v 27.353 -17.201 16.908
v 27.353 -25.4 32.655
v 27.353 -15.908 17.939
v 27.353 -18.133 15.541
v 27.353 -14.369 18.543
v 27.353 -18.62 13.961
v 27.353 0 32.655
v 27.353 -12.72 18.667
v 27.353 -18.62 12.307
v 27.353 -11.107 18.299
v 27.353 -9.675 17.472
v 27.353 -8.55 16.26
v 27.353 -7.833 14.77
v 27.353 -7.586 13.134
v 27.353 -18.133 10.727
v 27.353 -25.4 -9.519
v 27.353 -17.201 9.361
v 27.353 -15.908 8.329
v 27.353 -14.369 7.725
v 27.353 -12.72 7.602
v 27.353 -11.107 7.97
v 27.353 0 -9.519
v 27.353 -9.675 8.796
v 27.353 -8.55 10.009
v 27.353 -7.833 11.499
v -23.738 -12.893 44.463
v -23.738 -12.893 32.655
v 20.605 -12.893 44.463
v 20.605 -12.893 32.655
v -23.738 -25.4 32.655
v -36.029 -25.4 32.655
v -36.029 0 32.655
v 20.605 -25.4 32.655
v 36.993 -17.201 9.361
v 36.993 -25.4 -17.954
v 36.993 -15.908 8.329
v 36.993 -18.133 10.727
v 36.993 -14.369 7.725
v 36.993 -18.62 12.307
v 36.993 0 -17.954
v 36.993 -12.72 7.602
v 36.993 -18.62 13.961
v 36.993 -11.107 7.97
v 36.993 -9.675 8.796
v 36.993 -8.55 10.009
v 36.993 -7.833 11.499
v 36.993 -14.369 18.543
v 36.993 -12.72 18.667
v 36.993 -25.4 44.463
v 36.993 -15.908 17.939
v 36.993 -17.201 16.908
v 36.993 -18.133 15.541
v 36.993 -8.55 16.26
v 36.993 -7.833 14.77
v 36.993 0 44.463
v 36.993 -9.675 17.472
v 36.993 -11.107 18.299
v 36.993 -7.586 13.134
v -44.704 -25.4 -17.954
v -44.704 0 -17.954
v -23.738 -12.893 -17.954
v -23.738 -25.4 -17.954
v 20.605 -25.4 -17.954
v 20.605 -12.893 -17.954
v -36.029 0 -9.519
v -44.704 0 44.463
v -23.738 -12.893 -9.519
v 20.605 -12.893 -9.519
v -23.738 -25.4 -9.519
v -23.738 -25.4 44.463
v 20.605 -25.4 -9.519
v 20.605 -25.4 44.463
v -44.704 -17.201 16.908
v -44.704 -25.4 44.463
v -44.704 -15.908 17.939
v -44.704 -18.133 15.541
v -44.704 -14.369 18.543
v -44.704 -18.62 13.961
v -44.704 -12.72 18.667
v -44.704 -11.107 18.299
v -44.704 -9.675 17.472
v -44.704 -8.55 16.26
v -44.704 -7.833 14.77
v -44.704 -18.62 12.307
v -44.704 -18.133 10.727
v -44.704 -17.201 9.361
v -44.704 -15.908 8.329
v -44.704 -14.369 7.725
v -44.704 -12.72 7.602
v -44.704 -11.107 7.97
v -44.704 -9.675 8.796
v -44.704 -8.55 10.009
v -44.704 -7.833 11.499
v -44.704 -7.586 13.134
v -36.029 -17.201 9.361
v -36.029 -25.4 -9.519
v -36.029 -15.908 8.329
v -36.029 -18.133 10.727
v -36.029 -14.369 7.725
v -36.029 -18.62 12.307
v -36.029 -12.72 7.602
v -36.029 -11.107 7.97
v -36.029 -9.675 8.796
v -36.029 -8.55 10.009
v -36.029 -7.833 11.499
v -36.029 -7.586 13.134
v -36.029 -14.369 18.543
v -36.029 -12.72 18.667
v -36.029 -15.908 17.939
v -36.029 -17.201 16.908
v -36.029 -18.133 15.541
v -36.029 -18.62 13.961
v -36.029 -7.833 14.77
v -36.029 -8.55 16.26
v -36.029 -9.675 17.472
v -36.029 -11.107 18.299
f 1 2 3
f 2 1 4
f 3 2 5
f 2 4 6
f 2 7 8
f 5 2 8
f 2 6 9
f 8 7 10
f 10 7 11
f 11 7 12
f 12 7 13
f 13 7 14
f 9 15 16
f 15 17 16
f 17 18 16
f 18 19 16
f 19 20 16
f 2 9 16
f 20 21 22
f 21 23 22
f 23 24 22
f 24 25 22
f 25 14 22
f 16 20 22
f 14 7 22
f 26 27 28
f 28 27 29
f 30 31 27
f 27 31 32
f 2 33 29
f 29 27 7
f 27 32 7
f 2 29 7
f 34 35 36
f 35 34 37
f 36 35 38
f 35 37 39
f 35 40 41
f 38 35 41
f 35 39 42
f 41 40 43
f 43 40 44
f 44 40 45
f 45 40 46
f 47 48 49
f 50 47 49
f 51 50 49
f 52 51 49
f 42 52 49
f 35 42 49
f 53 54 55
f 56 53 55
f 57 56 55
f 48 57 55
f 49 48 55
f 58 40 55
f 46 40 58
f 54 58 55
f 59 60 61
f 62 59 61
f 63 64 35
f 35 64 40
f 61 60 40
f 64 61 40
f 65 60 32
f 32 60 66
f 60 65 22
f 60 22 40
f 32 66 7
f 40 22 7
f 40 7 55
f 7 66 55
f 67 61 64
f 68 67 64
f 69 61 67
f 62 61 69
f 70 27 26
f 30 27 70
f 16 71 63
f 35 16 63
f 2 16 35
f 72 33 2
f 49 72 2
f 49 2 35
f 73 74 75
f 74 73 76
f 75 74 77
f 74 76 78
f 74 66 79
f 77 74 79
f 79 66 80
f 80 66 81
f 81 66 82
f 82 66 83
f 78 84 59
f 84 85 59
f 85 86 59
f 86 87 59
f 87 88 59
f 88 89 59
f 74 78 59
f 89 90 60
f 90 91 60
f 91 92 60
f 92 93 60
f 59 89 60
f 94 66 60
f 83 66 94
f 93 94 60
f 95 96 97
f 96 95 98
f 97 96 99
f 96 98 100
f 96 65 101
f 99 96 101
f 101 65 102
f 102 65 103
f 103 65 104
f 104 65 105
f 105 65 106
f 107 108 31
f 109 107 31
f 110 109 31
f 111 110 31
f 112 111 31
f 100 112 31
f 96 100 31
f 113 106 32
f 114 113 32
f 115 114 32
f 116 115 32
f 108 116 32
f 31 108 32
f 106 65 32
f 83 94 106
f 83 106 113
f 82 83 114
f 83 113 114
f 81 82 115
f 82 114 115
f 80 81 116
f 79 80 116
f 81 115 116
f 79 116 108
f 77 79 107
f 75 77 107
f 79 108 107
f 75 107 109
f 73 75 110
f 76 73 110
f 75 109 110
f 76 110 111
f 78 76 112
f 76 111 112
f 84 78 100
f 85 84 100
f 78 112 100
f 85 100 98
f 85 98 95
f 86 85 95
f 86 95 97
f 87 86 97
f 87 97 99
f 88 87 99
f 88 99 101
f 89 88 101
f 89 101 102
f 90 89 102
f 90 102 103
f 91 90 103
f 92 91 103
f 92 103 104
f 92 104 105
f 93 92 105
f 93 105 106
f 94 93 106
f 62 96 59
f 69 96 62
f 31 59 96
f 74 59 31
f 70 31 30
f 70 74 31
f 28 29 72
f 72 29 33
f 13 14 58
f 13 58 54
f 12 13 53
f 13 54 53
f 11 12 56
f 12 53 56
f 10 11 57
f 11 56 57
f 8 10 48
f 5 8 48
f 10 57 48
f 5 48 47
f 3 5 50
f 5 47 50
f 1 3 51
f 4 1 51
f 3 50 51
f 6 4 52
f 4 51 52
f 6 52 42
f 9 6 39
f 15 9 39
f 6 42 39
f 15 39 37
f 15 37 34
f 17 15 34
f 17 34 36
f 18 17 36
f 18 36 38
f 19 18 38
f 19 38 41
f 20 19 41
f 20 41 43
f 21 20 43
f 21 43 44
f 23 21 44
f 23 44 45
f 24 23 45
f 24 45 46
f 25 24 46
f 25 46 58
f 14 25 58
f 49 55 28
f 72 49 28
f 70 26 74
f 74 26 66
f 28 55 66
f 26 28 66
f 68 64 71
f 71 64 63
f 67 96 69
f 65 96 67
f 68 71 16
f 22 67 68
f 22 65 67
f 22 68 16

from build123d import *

# Parameters (mm, degrees)
F0_W     = 63.3814185858
F0_H     = 8.4347892553
F1_DEPTH = 25.4
F2_W     = 44.3428922445
F2_H     = 12.5068214998
F3_DEPTH = 100.838
F4_R     = 5.5480982764
F5_DEPTH = 130.048


with BuildPart() as f1:
    # F0 (on Front) → F1 (new body)
    with BuildSketch(Plane.XZ):
        with Locations((-4.3378919363, -13.736656867)):
            Rectangle(F0_W, F0_H)
        Polygon((-36.0286012292, -17.9540514946), (-36.0286012292, -9.5192622393), (-36.0286012292, 32.654684037), (-44.7043813765, 32.654684037), (-44.7043813765, -17.9540514946), align=None)
        Polygon((27.3528173566, 32.654684037), (27.3528173566, -9.5192622393), (27.3528173566, -17.9540514946), (36.9925759733, -17.9540514946), (36.9925759733, 44.4633886218), (27.3528173566, 44.4633886218), align=None)
        Polygon((-44.7043813765, 32.654684037), (-36.0286012292, 32.654684037), (27.3528173566, 32.654684037), (27.3528173566, 44.4633886218), (-44.7043813765, 44.4633886218), align=None)
    extrude(amount=F1_DEPTH)

    # F2 (on face) → F3 (cut)
    with BuildSketch(Plane(origin=(0, 0, -17.9540514946), x_dir=(1, 0, 0), z_dir=(0, 0, -1))):
        with Locations((-1.5664612874, 19.1465892501)):
            Rectangle(F2_W, F2_H)
    extrude(amount=-F3_DEPTH, mode=Mode.SUBTRACT)

    # F4 (on face) → F5 (cut)
    with BuildSketch(Plane.YZ.offset(36.9925759733)):
        with Locations((-13.1341712549, 13.1341721863)):
            Circle(F4_R)
    extrude(amount=-F5_DEPTH, mode=Mode.SUBTRACT)


solid = f1.part
